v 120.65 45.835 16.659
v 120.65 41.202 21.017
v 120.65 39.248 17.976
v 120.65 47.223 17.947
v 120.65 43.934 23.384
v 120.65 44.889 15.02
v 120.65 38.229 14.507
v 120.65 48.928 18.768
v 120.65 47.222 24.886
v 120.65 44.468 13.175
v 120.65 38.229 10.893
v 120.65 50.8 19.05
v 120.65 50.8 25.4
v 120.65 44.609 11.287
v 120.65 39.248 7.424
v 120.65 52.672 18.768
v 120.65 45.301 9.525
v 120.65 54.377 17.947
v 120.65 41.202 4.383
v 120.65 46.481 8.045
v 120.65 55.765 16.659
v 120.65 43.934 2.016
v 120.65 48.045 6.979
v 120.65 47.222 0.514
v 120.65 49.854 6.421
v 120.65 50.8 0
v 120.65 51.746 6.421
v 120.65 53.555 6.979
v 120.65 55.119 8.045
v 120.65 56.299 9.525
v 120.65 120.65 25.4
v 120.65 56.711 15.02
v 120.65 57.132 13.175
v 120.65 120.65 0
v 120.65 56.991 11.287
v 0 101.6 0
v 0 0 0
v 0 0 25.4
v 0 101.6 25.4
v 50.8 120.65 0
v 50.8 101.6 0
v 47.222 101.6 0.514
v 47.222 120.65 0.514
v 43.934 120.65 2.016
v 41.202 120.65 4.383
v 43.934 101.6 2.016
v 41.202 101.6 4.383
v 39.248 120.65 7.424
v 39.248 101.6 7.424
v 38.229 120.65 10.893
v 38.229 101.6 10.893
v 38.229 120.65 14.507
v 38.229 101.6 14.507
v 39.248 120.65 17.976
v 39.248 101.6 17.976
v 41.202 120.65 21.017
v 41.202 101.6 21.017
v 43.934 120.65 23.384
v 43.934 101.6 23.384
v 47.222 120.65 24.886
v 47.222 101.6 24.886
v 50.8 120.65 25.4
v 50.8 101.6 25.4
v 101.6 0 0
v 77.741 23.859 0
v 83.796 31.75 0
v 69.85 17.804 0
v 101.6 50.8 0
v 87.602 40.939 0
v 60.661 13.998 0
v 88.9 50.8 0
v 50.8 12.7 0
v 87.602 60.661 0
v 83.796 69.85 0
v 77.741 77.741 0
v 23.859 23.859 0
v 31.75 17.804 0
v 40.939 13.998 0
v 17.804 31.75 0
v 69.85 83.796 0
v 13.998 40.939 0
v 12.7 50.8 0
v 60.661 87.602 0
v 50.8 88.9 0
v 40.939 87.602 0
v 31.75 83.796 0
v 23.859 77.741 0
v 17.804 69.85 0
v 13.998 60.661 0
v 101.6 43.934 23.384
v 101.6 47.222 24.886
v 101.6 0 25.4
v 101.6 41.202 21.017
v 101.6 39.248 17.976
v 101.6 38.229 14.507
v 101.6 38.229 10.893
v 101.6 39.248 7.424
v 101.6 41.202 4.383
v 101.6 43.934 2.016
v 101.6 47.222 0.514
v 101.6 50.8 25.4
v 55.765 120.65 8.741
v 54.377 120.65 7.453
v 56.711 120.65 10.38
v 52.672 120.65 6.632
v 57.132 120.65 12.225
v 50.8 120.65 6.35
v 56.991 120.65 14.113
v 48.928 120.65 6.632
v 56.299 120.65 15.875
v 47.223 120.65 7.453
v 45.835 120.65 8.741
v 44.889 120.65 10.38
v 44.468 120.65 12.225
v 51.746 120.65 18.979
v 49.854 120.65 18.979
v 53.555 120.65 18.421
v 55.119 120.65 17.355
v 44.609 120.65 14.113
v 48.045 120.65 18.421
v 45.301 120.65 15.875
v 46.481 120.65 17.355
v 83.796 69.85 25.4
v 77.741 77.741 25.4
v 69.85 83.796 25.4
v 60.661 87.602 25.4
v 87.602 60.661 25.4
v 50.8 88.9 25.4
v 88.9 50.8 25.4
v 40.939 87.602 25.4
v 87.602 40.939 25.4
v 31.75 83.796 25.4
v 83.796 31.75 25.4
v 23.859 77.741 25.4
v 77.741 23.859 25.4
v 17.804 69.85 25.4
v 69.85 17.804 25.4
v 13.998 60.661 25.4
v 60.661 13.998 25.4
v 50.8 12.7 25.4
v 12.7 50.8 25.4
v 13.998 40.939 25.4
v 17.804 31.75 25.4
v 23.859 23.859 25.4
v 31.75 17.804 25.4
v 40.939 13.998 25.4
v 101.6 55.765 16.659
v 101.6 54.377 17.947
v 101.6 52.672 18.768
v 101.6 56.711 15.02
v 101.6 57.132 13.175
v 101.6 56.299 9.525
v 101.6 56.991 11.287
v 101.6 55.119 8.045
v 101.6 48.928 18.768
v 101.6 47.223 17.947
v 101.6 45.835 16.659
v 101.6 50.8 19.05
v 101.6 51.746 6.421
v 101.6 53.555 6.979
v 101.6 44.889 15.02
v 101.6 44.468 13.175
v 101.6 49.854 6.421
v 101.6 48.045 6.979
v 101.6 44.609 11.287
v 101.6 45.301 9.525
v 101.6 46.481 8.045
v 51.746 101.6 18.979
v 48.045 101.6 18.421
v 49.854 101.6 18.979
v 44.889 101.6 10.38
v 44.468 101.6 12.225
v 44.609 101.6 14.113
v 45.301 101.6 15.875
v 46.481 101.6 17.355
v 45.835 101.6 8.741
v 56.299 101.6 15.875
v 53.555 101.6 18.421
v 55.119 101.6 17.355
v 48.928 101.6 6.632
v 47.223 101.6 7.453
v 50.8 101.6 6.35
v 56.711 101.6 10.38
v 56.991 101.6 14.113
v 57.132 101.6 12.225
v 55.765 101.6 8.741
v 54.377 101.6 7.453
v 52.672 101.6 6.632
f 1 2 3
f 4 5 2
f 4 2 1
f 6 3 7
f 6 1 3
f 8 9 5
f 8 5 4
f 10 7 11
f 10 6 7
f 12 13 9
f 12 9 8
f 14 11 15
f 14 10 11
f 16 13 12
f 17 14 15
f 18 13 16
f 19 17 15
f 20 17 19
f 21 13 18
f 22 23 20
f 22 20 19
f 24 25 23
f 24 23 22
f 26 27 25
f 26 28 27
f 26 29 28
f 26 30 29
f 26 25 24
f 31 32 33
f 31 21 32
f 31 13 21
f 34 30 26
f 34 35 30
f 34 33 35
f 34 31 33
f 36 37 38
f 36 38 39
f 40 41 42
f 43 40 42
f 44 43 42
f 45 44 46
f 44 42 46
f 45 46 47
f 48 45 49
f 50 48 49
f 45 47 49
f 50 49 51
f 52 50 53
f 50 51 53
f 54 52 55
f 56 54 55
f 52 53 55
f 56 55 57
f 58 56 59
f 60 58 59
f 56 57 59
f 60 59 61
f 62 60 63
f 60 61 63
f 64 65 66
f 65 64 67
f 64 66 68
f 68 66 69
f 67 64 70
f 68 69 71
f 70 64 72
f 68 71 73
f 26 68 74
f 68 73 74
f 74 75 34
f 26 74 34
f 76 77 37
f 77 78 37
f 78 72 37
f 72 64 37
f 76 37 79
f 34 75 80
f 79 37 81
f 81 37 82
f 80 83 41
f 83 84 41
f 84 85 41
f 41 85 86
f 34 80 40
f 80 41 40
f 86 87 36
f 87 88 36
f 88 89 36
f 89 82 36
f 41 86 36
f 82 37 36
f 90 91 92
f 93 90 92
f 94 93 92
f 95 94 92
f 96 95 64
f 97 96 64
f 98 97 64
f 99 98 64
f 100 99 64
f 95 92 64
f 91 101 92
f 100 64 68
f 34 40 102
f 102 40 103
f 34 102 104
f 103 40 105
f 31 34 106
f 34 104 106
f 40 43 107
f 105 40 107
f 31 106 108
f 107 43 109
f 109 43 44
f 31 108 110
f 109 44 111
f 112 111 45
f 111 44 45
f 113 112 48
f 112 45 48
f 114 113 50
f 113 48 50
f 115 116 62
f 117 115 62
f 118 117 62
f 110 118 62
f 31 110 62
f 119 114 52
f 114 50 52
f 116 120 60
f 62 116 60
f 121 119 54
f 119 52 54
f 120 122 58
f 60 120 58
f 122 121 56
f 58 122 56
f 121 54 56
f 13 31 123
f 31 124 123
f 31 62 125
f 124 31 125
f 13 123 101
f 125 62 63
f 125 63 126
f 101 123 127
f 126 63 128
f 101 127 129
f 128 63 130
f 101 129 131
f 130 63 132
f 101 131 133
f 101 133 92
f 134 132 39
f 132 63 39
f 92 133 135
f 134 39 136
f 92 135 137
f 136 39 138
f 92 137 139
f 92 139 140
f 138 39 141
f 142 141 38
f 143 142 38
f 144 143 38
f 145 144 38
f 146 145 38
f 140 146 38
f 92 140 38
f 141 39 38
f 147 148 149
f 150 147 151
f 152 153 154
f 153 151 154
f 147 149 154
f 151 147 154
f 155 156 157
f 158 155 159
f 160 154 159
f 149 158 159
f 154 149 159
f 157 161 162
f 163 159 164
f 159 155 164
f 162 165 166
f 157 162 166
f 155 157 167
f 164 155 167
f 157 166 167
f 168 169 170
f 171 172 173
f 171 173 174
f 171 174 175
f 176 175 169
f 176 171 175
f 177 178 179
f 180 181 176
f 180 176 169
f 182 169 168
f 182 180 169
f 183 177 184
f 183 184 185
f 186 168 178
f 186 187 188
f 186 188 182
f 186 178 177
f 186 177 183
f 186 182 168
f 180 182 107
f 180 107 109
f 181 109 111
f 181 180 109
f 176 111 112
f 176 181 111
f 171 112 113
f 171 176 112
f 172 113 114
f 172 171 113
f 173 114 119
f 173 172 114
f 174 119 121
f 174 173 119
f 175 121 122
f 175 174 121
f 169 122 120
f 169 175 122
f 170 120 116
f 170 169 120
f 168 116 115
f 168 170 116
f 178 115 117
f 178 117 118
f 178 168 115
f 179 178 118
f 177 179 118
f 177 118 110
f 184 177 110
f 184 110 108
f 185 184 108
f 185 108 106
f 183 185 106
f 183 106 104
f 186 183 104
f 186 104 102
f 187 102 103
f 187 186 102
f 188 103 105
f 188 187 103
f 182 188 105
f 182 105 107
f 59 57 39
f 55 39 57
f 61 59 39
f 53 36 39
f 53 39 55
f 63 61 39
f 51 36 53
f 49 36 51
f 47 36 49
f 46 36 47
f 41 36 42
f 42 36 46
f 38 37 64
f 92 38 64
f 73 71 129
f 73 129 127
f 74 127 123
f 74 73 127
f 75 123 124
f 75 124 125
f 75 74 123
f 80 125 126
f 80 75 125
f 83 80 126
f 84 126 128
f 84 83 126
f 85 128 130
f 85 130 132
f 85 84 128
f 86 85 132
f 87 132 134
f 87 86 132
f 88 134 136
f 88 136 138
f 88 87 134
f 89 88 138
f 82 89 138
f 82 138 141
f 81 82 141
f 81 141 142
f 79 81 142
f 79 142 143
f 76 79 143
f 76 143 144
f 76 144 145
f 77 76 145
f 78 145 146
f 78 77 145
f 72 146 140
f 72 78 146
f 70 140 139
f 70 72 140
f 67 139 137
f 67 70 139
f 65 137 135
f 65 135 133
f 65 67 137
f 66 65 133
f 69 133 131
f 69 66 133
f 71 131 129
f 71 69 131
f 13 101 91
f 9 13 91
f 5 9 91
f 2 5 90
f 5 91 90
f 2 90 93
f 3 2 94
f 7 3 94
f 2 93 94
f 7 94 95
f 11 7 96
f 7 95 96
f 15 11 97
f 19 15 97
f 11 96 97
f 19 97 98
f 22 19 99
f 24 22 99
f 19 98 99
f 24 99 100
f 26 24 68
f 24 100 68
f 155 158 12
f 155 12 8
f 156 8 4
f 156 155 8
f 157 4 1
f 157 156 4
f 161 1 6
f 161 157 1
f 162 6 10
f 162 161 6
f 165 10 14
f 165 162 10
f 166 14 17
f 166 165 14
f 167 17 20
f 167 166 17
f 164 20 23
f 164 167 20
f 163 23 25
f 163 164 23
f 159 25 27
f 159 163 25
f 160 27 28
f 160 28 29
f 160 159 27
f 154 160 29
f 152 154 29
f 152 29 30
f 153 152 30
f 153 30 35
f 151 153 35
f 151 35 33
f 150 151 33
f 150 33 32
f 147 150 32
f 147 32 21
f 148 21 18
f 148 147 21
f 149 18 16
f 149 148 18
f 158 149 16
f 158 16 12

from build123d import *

# Parameters (mm, degrees)
SKETCH2_W           = 101.6
SKETCH2_H           = 101.6
SKETCH2_R           = 38.1
BOSS_EXTRUDE1_DEPTH = 25.4
SKETCH3_R           = 6.35
BOSS_EXTRUDE2_DEPTH = 19.05
SKETCH4_R           = 6.35
BOSS_EXTRUDE3_DEPTH = 19.05


with BuildPart() as part:
    # Sketch2 → Boss-Extrude1 (new body)
    with BuildSketch(Plane.XY):
        with Locations((50.8, 50.8)):
            Rectangle(SKETCH2_W, SKETCH2_H)
        with Locations((50.8, 50.8)):
            Circle(SKETCH2_R, mode=Mode.SUBTRACT)
    extrude(amount=BOSS_EXTRUDE1_DEPTH)

    # Sketch3 → Boss-Extrude2 (add)
    with BuildSketch(Plane(origin=(0, 101.6, 0), x_dir=(1, 0, 0), z_dir=(0, 1, 0))):
        with BuildLine():
            Line((101.6, -25.4), (101.6, 0))
            Line((101.6, 0), (50.8, 0))
            ThreePointArc((50.8, 0), (38.1, -12.7), (50.8, -25.4))
            Line((50.8, -25.4), (101.6, -25.4))
        make_face()
        with Locations(Location((50.8, -12.7, 0), (0, 0, 90))):
            Circle(SKETCH3_R, mode=Mode.SUBTRACT)
    extrude(amount=BOSS_EXTRUDE2_DEPTH)

    # Sketch4 → Boss-Extrude3 (add)
    with BuildSketch(Plane(origin=(101.6, 0, 0), x_dir=(0, 0, -1), z_dir=(1, 0, 0))):
        with BuildLine():
            Line((0, 120.65), (-25.4, 120.65))
            Line((-25.4, 120.65), (-25.4, 50.8))
            ThreePointArc((-25.4, 50.8), (-12.7, 38.1), (0, 50.8))
            Line((0, 50.8), (0, 120.65))
        make_face()
        with Locations(Location((-12.7, 50.8, 0), (0, 0, 180))):
            Circle(SKETCH4_R, mode=Mode.SUBTRACT)
    extrude(amount=BOSS_EXTRUDE3_DEPTH)


solid = part.part
